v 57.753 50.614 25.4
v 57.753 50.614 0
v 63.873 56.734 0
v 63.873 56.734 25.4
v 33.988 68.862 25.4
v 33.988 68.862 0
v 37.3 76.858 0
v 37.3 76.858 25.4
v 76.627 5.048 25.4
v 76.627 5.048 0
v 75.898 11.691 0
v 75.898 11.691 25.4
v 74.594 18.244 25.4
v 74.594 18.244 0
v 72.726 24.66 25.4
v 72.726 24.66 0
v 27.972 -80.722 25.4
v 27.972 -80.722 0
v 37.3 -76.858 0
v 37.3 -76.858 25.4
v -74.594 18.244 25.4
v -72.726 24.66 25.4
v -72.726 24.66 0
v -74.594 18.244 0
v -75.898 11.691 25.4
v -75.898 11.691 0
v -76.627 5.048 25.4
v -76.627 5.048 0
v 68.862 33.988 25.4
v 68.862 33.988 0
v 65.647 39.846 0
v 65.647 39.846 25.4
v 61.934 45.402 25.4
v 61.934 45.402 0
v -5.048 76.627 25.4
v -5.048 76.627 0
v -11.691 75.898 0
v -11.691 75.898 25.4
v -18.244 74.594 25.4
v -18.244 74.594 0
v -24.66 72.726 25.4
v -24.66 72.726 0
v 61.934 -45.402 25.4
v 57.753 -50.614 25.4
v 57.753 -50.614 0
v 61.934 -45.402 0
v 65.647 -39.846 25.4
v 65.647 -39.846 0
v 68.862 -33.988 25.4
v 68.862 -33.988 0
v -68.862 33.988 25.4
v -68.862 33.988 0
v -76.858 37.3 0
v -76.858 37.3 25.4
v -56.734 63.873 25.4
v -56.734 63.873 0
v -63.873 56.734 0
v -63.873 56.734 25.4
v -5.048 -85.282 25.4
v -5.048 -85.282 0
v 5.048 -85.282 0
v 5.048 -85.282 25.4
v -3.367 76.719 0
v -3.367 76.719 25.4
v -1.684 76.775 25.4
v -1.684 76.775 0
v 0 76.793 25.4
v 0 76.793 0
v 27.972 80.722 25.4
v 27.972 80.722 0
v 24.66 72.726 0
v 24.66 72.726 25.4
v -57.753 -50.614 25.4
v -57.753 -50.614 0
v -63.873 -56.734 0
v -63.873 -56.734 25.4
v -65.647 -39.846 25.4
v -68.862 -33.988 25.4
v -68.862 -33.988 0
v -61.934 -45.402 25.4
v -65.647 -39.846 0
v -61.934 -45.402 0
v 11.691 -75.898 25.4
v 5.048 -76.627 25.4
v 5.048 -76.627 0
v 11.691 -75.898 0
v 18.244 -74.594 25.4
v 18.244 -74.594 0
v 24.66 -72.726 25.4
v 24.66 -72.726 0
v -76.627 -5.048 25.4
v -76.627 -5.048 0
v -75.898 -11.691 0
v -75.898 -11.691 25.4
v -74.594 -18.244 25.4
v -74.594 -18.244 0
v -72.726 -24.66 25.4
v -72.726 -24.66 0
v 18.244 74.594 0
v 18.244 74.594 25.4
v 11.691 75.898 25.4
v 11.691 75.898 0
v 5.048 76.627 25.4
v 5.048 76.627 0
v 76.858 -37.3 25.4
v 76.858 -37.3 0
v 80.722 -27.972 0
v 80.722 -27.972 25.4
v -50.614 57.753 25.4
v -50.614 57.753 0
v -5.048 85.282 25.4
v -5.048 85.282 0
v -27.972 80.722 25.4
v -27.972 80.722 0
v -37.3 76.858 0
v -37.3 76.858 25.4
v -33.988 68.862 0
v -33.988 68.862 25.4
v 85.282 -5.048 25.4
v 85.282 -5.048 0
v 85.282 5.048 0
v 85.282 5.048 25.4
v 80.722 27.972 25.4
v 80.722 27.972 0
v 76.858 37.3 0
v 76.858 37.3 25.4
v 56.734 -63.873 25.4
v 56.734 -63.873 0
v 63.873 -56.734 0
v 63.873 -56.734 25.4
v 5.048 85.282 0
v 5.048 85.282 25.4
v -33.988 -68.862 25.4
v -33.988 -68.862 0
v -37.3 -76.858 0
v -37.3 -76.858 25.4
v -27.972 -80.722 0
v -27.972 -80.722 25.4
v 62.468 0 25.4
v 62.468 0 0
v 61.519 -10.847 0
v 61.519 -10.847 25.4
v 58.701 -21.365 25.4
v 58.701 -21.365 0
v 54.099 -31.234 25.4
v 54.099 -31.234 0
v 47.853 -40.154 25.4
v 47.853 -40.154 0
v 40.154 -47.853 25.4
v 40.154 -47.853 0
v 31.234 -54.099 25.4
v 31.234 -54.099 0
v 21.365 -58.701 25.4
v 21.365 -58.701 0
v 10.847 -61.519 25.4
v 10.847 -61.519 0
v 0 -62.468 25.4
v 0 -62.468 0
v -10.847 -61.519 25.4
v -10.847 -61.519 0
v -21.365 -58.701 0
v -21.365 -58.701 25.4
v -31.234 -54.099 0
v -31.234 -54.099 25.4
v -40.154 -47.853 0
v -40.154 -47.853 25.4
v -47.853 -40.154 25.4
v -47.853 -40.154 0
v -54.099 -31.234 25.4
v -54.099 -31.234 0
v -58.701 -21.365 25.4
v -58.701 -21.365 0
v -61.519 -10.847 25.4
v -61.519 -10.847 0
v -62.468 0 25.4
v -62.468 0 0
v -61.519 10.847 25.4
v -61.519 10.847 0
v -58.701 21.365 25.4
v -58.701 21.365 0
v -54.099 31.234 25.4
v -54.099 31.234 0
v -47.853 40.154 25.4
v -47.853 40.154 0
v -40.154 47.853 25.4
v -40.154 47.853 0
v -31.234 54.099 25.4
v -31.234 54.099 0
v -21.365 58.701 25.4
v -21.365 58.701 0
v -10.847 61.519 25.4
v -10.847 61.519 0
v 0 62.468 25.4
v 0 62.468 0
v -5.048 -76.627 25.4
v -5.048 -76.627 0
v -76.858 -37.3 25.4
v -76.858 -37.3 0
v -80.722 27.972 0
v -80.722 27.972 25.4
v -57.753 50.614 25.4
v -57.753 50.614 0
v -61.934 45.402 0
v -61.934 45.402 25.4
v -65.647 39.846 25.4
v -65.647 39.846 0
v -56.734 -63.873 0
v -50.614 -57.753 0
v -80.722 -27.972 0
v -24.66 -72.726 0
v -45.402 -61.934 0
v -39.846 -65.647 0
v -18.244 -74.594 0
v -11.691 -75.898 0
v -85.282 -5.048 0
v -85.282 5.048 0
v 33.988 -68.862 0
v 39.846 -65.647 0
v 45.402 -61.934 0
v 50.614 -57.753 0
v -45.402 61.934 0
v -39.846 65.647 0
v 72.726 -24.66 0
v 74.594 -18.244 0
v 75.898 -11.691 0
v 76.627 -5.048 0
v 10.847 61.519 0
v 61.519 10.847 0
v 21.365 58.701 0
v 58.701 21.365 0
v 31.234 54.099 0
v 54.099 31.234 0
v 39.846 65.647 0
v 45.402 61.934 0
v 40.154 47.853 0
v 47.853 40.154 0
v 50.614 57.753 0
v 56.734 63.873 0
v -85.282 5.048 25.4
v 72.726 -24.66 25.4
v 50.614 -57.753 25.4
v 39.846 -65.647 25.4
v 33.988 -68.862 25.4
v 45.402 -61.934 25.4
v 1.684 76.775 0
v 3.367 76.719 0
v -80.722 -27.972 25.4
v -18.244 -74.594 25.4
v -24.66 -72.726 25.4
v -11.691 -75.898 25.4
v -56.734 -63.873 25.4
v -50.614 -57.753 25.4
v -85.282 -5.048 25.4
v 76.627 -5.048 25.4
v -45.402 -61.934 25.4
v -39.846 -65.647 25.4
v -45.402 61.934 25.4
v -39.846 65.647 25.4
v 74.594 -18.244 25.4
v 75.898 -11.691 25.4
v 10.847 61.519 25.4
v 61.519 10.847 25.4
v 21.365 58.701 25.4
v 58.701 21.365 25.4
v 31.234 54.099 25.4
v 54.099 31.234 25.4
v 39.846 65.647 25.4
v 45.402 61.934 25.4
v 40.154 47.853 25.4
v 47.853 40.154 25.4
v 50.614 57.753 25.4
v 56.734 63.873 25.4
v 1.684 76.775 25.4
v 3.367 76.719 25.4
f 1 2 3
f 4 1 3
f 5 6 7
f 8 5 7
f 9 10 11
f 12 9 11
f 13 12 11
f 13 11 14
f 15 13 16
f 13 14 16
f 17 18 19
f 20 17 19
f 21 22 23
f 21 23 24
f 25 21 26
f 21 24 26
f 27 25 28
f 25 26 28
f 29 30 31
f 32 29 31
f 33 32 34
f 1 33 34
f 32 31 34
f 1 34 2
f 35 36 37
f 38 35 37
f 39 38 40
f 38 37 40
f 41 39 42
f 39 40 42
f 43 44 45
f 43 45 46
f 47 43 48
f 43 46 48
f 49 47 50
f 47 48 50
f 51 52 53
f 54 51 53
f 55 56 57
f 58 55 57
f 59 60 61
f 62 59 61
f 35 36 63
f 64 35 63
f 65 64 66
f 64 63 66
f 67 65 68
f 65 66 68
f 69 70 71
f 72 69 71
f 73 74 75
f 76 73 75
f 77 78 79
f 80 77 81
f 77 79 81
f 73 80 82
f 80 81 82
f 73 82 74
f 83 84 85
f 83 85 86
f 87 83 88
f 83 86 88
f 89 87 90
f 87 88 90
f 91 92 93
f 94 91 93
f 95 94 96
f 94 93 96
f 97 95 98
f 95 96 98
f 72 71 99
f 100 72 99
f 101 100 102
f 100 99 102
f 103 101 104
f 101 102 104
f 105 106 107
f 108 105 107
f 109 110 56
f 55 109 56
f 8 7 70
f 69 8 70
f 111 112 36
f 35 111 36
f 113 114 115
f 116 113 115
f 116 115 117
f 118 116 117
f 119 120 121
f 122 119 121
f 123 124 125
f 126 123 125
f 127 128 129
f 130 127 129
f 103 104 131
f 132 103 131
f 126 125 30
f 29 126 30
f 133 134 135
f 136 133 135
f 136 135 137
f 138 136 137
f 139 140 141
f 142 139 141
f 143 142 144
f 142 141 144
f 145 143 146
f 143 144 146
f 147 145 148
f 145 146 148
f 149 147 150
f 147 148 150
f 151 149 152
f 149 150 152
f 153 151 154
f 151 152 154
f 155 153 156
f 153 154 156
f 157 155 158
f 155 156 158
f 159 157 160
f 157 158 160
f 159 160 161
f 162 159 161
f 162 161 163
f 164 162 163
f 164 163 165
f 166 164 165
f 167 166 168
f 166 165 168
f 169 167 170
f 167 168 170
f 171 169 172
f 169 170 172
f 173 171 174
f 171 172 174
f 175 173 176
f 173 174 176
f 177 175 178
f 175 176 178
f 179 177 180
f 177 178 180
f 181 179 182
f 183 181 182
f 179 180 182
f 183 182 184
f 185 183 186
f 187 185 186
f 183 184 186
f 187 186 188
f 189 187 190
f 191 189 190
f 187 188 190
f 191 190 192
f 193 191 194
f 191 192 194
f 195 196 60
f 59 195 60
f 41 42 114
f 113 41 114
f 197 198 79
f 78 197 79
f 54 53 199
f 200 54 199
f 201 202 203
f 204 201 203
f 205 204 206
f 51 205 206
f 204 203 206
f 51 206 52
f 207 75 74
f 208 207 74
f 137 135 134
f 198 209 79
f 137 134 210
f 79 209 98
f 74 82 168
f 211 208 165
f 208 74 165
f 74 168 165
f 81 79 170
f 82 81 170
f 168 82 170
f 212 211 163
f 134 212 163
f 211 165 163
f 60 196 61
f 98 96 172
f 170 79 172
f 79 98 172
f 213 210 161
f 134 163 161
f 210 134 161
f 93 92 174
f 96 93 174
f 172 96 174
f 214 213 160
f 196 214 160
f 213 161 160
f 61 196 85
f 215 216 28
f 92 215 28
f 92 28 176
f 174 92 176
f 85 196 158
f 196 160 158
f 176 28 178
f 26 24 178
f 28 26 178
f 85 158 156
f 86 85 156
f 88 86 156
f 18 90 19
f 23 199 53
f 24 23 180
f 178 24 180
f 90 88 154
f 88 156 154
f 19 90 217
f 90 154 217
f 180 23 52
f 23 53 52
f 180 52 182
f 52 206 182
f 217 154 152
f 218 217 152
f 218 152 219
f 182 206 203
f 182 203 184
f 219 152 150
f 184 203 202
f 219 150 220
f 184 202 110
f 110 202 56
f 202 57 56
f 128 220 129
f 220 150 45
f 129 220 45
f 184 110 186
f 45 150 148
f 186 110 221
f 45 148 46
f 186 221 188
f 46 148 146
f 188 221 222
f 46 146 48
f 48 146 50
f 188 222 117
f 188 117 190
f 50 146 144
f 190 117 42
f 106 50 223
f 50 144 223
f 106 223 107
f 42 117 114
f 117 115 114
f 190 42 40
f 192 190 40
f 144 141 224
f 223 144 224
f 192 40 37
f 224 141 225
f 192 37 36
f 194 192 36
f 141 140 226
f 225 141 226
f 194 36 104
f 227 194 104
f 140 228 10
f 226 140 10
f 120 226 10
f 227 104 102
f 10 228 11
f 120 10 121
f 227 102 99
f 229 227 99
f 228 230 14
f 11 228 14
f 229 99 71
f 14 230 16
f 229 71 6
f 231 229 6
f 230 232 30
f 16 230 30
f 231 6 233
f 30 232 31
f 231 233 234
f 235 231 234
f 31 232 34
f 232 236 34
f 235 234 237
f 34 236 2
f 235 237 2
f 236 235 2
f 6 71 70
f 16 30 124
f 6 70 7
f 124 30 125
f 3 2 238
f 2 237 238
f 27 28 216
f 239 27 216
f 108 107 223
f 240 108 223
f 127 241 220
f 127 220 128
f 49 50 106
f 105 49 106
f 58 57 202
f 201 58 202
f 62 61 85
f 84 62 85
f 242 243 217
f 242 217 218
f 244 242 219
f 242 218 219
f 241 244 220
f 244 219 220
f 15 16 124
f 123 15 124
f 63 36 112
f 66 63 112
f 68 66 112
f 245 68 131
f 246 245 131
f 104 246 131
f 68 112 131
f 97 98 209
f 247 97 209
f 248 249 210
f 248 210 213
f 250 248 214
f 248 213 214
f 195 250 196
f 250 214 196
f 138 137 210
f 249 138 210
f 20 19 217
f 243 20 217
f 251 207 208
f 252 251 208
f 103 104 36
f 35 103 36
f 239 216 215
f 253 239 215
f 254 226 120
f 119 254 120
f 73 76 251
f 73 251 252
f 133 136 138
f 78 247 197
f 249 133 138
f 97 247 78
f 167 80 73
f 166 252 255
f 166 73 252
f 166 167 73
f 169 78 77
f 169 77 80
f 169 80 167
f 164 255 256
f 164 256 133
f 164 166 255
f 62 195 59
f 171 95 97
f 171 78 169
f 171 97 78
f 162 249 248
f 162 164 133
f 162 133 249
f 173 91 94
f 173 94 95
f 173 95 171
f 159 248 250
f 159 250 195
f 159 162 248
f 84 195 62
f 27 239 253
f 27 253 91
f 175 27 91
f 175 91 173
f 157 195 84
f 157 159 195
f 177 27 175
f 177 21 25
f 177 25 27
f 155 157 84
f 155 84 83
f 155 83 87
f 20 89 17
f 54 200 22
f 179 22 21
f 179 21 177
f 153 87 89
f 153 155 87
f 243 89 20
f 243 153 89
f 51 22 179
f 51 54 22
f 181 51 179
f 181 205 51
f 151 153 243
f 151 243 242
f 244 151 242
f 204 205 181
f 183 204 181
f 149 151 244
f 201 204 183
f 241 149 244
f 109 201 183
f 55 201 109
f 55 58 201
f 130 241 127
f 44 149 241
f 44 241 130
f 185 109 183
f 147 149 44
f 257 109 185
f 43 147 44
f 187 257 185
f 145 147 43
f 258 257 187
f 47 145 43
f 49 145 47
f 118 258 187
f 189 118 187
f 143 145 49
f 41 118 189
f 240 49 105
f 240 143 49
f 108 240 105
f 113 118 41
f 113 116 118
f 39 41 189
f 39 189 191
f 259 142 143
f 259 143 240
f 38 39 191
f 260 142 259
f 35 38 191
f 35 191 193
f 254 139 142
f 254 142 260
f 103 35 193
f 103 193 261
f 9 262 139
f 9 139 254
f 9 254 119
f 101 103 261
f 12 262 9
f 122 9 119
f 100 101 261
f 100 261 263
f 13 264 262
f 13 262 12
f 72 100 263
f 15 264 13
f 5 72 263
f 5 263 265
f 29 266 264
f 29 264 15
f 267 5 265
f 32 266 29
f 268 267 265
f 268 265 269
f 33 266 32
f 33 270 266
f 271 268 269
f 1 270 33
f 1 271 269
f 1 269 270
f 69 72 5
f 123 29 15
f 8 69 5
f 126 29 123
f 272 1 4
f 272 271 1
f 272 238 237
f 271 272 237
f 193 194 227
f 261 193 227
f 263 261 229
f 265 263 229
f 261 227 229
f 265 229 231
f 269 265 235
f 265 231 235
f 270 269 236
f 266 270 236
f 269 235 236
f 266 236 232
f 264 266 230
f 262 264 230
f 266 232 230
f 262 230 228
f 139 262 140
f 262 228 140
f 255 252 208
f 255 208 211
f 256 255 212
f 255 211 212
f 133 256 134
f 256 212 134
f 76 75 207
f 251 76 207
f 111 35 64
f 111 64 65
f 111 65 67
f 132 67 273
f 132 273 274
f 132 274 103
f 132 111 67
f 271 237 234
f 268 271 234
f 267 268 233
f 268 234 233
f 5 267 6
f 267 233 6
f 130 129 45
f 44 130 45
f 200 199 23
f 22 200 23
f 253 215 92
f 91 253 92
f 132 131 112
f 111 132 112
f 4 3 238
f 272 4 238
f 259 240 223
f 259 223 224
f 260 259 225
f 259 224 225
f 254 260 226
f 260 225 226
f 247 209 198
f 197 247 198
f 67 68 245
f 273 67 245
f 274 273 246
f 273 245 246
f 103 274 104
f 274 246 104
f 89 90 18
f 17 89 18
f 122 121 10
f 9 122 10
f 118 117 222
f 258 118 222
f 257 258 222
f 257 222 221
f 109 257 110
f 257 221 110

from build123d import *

# Parameters (mm, degrees)
F1_DEPTH = 25.4
F2_COUNT = 16
F3_DEPTH = 25.4


with BuildPart() as f1:
    # F0 (on Top) → F1 (new body)
    with BuildSketch(Plane.XY):
        with BuildLine():
            ThreePointArc((0, 76.793102), (2.52551, 76.751562), (5.048288, 76.626988))
            Line((5.048288, 76.626988), (5.048288, 85.281685))
            Line((5.048288, 85.281685), (0, 85.281685))
            Line((0, 85.281685), (-5.048288, 85.281685))
            Line((-5.048288, 85.281685), (-5.048288, 76.626988))
            ThreePointArc((-5.048288, 76.626988), (-2.52551, 76.751562), (0, 76.793102))
        make_face()
    extrude(amount=F1_DEPTH)



with BuildPart() as f2_1:
    # F2: instance of F1
    add(f1.part.rotate(Axis((0, 0, 0), (0, 0, -1)), 1 * 360 / F2_COUNT))


with BuildPart() as f2_2:
    # F2: instance of F1
    add(f1.part.rotate(Axis((0, 0, 0), (0, 0, -1)), 2 * 360 / F2_COUNT))


with BuildPart() as f2_3:
    # F2: instance of F1
    add(f1.part.rotate(Axis((0, 0, 0), (0, 0, -1)), 3 * 360 / F2_COUNT))


with BuildPart() as f2_4:
    # F2: instance of F1
    add(f1.part.rotate(Axis((0, 0, 0), (0, 0, -1)), 4 * 360 / F2_COUNT))


with BuildPart() as f2_5:
    # F2: instance of F1
    add(f1.part.rotate(Axis((0, 0, 0), (0, 0, -1)), 5 * 360 / F2_COUNT))


with BuildPart() as f2_6:
    # F2: instance of F1
    add(f1.part.rotate(Axis((0, 0, 0), (0, 0, -1)), 6 * 360 / F2_COUNT))


with BuildPart() as f2_7:
    # F2: instance of F1
    add(f1.part.rotate(Axis((0, 0, 0), (0, 0, -1)), 7 * 360 / F2_COUNT))


with BuildPart() as f2_8:
    # F2: instance of F1
    add(f1.part.rotate(Axis((0, 0, 0), (0, 0, -1)), 8 * 360 / F2_COUNT))


with BuildPart() as f2_9:
    # F2: instance of F1
    add(f1.part.rotate(Axis((0, 0, 0), (0, 0, -1)), 9 * 360 / F2_COUNT))


with BuildPart() as f2_10:
    # F2: instance of F1
    add(f1.part.rotate(Axis((0, 0, 0), (0, 0, -1)), 10 * 360 / F2_COUNT))


with BuildPart() as f2_11:
    # F2: instance of F1
    add(f1.part.rotate(Axis((0, 0, 0), (0, 0, -1)), 11 * 360 / F2_COUNT))


with BuildPart() as f2_12:
    # F2: instance of F1
    add(f1.part.rotate(Axis((0, 0, 0), (0, 0, -1)), 12 * 360 / F2_COUNT))


with BuildPart() as f2_13:
    # F2: instance of F1
    add(f1.part.rotate(Axis((0, 0, 0), (0, 0, -1)), 13 * 360 / F2_COUNT))


with BuildPart() as f2_14:
    # F2: instance of F1
    add(f1.part.rotate(Axis((0, 0, 0), (0, 0, -1)), 14 * 360 / F2_COUNT))


with BuildPart() as f2_15:
    # F2: instance of F1
    add(f1.part.rotate(Axis((0, 0, 0), (0, 0, -1)), 15 * 360 / F2_COUNT))


with BuildPart() as f1_1:
    add(f1.part)

    add(f2_1.part)  # F3 merges F2_1

    add(f2_2.part)  # F3 merges F2_2

    add(f2_3.part)  # F3 merges F2_3

    add(f2_4.part)  # F3 merges F2_4

    add(f2_5.part)  # F3 merges F2_5

    add(f2_6.part)  # F3 merges F2_6

    add(f2_7.part)  # F3 merges F2_7

    add(f2_8.part)  # F3 merges F2_8

    add(f2_9.part)  # F3 merges F2_9

    add(f2_10.part)  # F3 merges F2_10

    add(f2_11.part)  # F3 merges F2_11

    add(f2_12.part)  # F3 merges F2_12

    add(f2_13.part)  # F3 merges F2_13

    add(f2_14.part)  # F3 merges F2_14

    add(f2_15.part)  # F3 merges F2_15
    # F0 (on Top) → F3 (join)
    with BuildSketch(Plane.XY):
        with BuildLine():
            ThreePointArc((-5.048288, 76.626988), (-52.485745, -56.057356), (76.793102, 0))
            ThreePointArc((76.793102, 0), (56.057356, 52.485745), (5.048288, 76.626988))
            Line((5.048288, 76.626988), (0, 76.626988))
            Line((0, 76.626988), (-5.048288, 76.626988))
        make_face()
        with BuildLine():
            ThreePointArc((62.467949, 0), (-44.17151, -44.17151), (0, 62.467949))
            ThreePointArc((0, 62.467949), (44.17151, 44.17151), (62.467949, 0))
        make_face(mode=Mode.SUBTRACT)
    extrude(amount=F3_DEPTH)


solid = f1_1.part
